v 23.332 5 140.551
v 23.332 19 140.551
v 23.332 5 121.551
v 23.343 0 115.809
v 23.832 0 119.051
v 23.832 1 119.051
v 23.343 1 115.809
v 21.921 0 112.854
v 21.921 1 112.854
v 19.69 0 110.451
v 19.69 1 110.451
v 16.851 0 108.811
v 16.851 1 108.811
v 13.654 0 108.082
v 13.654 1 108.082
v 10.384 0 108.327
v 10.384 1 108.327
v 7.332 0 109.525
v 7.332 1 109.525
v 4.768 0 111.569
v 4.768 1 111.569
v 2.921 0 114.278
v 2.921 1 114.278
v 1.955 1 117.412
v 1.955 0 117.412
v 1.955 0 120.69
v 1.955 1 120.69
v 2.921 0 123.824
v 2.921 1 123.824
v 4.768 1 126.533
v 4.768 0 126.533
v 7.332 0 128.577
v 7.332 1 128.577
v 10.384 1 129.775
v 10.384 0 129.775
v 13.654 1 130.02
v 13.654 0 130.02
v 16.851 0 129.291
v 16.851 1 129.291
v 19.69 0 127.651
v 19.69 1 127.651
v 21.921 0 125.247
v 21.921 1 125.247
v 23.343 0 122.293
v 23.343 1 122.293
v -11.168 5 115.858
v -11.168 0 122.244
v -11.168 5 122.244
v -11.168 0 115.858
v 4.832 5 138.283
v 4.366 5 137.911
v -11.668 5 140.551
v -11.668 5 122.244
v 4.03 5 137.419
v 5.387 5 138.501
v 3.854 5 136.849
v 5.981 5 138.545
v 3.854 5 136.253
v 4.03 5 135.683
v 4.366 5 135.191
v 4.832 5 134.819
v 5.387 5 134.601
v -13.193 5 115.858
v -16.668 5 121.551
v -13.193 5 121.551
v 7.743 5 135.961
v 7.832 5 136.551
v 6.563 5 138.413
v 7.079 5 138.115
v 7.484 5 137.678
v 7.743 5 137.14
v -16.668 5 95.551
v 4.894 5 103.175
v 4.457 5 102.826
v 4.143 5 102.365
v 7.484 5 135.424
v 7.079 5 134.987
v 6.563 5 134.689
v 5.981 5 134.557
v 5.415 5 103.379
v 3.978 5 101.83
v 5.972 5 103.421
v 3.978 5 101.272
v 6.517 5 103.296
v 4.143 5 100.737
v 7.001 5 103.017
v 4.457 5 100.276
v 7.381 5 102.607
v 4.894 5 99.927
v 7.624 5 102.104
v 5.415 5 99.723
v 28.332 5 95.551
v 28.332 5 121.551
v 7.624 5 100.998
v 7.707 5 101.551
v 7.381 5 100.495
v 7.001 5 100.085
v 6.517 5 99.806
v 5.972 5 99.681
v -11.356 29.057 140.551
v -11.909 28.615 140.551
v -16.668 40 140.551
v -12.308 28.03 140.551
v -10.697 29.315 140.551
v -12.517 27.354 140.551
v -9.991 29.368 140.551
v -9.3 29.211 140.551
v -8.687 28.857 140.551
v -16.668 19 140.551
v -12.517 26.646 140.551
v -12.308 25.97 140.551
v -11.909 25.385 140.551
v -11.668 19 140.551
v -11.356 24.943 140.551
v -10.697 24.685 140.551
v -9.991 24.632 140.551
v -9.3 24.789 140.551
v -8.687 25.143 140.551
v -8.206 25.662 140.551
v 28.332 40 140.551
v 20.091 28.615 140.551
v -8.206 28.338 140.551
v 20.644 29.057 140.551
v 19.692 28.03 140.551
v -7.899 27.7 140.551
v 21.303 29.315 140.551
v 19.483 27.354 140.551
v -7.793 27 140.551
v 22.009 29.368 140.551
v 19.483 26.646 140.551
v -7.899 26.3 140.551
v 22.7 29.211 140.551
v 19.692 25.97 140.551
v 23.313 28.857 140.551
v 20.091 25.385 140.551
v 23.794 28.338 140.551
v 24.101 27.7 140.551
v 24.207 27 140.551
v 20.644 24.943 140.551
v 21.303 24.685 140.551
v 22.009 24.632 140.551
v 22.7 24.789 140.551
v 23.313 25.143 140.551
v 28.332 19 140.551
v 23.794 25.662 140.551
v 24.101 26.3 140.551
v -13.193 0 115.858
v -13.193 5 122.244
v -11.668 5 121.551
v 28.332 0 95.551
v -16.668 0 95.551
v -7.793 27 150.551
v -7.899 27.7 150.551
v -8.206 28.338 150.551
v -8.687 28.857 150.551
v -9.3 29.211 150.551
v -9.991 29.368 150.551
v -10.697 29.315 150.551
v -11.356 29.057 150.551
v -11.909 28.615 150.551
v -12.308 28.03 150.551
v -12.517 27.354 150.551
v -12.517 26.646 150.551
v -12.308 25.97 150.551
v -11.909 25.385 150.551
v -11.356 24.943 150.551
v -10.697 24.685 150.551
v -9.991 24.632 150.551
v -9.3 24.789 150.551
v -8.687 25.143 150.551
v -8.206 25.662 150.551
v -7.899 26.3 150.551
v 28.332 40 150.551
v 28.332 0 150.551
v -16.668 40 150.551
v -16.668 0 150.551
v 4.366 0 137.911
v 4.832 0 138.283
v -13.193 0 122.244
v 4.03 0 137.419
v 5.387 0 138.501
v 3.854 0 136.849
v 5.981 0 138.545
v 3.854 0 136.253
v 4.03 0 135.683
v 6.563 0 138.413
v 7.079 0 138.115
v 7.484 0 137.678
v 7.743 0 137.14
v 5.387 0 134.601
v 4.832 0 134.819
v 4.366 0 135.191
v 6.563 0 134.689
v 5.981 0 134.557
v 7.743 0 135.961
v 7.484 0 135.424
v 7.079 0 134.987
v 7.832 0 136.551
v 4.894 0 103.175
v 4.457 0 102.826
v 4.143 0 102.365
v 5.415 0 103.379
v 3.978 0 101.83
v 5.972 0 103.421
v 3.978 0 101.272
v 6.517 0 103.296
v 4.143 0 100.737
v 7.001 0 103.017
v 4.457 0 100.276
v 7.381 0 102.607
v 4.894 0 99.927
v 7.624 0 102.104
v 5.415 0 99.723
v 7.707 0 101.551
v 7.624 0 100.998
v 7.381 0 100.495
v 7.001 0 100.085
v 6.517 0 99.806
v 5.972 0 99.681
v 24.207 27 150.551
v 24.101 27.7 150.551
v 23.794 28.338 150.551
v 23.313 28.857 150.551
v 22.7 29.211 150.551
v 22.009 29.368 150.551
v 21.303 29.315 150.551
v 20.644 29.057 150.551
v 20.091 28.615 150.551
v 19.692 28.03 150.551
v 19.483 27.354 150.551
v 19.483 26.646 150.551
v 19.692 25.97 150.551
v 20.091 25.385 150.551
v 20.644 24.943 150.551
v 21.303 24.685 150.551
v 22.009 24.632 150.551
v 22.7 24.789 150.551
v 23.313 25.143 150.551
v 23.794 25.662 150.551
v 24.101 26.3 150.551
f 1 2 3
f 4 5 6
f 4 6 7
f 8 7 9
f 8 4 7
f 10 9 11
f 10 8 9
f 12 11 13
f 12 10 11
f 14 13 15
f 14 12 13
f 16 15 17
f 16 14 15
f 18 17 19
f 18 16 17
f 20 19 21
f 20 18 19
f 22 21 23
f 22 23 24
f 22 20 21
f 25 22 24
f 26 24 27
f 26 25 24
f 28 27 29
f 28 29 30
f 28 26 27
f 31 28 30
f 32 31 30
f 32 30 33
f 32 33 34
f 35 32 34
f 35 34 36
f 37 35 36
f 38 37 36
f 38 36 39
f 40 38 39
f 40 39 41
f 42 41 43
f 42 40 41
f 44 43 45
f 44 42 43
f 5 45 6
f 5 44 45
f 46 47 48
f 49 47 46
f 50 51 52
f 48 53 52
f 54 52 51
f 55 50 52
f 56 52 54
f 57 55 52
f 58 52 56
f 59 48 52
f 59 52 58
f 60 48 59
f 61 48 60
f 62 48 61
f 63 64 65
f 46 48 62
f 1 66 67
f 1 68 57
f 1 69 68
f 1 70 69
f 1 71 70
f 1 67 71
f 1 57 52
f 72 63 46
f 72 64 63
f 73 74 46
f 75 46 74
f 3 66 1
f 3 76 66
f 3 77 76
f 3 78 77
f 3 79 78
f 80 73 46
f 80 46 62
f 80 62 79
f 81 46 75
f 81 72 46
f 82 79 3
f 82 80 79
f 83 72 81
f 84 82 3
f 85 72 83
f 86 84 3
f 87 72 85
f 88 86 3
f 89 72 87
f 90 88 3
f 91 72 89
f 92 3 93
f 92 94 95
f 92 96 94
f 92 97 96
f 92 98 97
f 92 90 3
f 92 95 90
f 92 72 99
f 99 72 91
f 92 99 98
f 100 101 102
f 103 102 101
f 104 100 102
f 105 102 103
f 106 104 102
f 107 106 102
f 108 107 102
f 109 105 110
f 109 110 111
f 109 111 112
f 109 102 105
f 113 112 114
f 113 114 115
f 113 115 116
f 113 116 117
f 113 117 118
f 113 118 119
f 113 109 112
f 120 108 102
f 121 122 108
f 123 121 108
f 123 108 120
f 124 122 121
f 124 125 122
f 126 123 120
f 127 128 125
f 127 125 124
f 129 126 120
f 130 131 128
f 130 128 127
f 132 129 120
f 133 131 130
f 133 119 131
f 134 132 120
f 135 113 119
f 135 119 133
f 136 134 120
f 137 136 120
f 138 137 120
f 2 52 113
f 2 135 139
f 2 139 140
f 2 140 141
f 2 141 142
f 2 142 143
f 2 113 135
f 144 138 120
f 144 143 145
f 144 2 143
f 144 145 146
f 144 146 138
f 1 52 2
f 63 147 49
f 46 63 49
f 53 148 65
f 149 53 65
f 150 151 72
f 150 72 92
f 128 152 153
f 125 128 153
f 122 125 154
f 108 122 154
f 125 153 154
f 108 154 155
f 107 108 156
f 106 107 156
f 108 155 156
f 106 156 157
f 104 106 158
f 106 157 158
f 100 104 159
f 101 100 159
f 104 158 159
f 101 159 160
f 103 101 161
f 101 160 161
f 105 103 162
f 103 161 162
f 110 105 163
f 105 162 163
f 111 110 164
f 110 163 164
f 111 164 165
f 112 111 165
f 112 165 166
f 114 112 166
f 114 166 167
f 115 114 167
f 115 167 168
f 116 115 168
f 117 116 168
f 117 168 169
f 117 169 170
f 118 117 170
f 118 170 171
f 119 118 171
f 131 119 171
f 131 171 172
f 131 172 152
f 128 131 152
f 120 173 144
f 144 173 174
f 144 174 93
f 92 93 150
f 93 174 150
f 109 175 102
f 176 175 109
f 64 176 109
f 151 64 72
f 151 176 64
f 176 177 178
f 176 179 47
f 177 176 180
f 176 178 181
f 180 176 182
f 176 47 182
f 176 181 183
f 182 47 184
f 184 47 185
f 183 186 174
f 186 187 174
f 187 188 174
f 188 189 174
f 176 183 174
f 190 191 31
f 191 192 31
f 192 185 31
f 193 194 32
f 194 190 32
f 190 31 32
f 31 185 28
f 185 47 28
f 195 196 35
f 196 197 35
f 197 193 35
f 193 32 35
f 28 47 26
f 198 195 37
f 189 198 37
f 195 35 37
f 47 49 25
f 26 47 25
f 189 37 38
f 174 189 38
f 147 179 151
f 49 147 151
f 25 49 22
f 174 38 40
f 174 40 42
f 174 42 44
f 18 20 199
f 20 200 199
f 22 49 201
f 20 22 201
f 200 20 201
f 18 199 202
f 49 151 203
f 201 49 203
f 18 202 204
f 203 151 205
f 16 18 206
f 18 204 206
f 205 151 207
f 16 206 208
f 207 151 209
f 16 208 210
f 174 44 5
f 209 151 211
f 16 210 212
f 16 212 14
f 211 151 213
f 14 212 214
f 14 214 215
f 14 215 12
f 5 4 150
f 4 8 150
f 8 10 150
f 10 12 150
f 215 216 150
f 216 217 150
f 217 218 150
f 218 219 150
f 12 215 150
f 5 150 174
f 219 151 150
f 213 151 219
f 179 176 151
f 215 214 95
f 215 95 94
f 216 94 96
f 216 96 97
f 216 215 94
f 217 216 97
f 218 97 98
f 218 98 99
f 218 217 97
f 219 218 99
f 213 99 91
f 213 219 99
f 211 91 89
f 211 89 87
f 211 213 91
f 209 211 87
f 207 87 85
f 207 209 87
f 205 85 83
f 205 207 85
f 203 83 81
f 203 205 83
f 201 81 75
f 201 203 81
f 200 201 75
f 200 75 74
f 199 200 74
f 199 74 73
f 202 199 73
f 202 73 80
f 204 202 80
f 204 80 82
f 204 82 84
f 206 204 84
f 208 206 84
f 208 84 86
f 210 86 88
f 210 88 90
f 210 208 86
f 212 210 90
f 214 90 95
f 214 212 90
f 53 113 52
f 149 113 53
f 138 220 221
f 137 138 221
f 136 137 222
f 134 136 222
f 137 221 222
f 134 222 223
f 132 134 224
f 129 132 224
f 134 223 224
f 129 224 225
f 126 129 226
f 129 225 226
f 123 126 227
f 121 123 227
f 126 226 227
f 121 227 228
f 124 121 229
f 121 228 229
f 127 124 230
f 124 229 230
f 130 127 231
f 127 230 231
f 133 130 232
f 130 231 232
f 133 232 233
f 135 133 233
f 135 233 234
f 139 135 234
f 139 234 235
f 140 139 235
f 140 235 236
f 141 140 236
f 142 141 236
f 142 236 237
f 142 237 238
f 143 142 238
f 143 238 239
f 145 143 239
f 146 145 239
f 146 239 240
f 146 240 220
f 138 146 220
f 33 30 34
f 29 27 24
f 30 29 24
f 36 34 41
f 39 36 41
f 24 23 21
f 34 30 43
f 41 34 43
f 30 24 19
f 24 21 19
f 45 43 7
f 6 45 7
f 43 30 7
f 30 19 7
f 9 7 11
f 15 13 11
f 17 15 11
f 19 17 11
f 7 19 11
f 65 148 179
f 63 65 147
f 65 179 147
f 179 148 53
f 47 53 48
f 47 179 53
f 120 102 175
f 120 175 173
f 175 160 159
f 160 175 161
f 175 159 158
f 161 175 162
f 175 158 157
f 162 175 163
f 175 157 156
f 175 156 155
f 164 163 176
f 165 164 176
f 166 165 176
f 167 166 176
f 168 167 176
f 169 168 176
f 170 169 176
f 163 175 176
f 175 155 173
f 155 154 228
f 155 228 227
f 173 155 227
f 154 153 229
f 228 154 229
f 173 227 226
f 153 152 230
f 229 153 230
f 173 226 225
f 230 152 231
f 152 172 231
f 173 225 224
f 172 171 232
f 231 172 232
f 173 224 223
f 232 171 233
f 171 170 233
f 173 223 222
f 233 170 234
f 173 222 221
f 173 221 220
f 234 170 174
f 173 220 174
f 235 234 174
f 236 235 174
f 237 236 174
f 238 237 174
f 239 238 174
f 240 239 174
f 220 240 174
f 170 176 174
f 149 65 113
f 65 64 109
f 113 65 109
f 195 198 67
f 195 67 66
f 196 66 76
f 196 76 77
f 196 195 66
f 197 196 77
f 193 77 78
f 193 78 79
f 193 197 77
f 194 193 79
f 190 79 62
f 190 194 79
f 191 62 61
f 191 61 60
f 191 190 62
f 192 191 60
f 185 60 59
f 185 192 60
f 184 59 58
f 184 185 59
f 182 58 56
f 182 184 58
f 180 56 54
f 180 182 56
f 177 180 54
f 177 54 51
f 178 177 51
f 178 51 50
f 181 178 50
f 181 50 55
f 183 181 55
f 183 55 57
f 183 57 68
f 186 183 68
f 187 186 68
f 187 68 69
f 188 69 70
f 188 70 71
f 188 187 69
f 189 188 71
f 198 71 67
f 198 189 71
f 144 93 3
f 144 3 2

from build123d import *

# Parameters (mm, degrees)
SKETCH7_W                = 45
SKETCH7_H                = 45
SKETCH7_W_2              = 2.024682368
SKETCH7_H_2              = 6.385975888
SKETCH7_R                = 2
SKETCH7_R_2              = 1.875
BOSS_EXTRUDE5_DEPTH      = 5
SKETCH7_3_W              = 45
SKETCH7_3_H              = 2
BOSS_EXTRUDE6_DEPTH      = 40
BOSS_EXTRUDE7_DEPTH      = 5
SKETCH7_4_W              = 45
SKETCH7_4_H              = 8
BOSS_EXTRUDE8_DEPTH      = 40
SKETCH11_R               = 2.375
CUT_EXTRUDE16_DEPTH      = 1
CUT_EXTRUDE16_DEPTH_BACK = 56
SKETCH7_14_R             = 11
CUT_EXTRUDE17_DEPTH      = 1


with BuildPart() as part:
    # Sketch7 → Boss-Extrude5 (new body)
    with BuildSketch(Plane(origin=(0, 0, 0), x_dir=(1, 0, 0), z_dir=(0, 1, 0))):
        with Locations((5.831933892, -118.050969126)):
            Rectangle(SKETCH7_W, SKETCH7_H)
        with Locations((-12.180407292, -119.050969126)):
            Rectangle(SKETCH7_W_2, SKETCH7_H_2, mode=Mode.SUBTRACT)
        with Locations((5.831933892, -136.550969126)):
            Circle(SKETCH7_R, mode=Mode.SUBTRACT)
        with Locations((5.831933892, -101.550969126)):
            Circle(SKETCH7_R_2, mode=Mode.SUBTRACT)
    extrude(amount=BOSS_EXTRUDE5_DEPTH)

    # Sketch7_3 → Boss-Extrude6 (add)
    with BuildSketch(Plane(origin=(0, 0, 0), x_dir=(1, 0, 0), z_dir=(0, 1, 0))):
        with Locations((5.831933892, -141.550969126)):
            Rectangle(SKETCH7_3_W, SKETCH7_3_H)
    extrude(amount=BOSS_EXTRUDE6_DEPTH)

    # Sketch8 → Boss-Extrude7 (add)
    with BuildSketch(Plane.ZY.offset(16.668066108)):
        Polygon((140.550969126, 11), (140.550969126, 5), (121.550969126, 5), (140.550969126, 19), align=None)
    boss_extrude7 = extrude(amount=-BOSS_EXTRUDE7_DEPTH)

    # Mirror2: Boss-Extrude7 across plane
    add(boss_extrude7.mirror(Plane.ZY.offset(-5.831933892)))

    # Sketch7_4 → Boss-Extrude8 (add)
    with BuildSketch(Plane(origin=(0, 0, 0), x_dir=(1, 0, 0), z_dir=(0, 1, 0))):
        with Locations((5.831933892, -146.550969126)):
            Rectangle(SKETCH7_4_W, SKETCH7_4_H)
    extrude(amount=BOSS_EXTRUDE8_DEPTH)

    # Sketch11 → Cut-Extrude16 (cut, two sides)
    with BuildSketch(Plane.XY.offset(150.550969126)) as cut_extrude16_sk:
        with Locations((-10.168066108, 27)):
            Circle(SKETCH11_R)
        with Locations((21.831933892, 27)):
            Circle(SKETCH11_R)
    extrude(amount=CUT_EXTRUDE16_DEPTH, mode=Mode.SUBTRACT)
    extrude(cut_extrude16_sk.sketch, amount=-CUT_EXTRUDE16_DEPTH_BACK, mode=Mode.SUBTRACT)

    # Sketch7_14 → Cut-Extrude17 (cut)
    with BuildSketch(Plane(origin=(0, 0, 0), x_dir=(1, 0, 0), z_dir=(0, 1, 0))):
        with Locations((12.831933892, -119.050969126)):
            Circle(SKETCH7_14_R)
    extrude(amount=CUT_EXTRUDE17_DEPTH, mode=Mode.SUBTRACT)


solid = part.part
